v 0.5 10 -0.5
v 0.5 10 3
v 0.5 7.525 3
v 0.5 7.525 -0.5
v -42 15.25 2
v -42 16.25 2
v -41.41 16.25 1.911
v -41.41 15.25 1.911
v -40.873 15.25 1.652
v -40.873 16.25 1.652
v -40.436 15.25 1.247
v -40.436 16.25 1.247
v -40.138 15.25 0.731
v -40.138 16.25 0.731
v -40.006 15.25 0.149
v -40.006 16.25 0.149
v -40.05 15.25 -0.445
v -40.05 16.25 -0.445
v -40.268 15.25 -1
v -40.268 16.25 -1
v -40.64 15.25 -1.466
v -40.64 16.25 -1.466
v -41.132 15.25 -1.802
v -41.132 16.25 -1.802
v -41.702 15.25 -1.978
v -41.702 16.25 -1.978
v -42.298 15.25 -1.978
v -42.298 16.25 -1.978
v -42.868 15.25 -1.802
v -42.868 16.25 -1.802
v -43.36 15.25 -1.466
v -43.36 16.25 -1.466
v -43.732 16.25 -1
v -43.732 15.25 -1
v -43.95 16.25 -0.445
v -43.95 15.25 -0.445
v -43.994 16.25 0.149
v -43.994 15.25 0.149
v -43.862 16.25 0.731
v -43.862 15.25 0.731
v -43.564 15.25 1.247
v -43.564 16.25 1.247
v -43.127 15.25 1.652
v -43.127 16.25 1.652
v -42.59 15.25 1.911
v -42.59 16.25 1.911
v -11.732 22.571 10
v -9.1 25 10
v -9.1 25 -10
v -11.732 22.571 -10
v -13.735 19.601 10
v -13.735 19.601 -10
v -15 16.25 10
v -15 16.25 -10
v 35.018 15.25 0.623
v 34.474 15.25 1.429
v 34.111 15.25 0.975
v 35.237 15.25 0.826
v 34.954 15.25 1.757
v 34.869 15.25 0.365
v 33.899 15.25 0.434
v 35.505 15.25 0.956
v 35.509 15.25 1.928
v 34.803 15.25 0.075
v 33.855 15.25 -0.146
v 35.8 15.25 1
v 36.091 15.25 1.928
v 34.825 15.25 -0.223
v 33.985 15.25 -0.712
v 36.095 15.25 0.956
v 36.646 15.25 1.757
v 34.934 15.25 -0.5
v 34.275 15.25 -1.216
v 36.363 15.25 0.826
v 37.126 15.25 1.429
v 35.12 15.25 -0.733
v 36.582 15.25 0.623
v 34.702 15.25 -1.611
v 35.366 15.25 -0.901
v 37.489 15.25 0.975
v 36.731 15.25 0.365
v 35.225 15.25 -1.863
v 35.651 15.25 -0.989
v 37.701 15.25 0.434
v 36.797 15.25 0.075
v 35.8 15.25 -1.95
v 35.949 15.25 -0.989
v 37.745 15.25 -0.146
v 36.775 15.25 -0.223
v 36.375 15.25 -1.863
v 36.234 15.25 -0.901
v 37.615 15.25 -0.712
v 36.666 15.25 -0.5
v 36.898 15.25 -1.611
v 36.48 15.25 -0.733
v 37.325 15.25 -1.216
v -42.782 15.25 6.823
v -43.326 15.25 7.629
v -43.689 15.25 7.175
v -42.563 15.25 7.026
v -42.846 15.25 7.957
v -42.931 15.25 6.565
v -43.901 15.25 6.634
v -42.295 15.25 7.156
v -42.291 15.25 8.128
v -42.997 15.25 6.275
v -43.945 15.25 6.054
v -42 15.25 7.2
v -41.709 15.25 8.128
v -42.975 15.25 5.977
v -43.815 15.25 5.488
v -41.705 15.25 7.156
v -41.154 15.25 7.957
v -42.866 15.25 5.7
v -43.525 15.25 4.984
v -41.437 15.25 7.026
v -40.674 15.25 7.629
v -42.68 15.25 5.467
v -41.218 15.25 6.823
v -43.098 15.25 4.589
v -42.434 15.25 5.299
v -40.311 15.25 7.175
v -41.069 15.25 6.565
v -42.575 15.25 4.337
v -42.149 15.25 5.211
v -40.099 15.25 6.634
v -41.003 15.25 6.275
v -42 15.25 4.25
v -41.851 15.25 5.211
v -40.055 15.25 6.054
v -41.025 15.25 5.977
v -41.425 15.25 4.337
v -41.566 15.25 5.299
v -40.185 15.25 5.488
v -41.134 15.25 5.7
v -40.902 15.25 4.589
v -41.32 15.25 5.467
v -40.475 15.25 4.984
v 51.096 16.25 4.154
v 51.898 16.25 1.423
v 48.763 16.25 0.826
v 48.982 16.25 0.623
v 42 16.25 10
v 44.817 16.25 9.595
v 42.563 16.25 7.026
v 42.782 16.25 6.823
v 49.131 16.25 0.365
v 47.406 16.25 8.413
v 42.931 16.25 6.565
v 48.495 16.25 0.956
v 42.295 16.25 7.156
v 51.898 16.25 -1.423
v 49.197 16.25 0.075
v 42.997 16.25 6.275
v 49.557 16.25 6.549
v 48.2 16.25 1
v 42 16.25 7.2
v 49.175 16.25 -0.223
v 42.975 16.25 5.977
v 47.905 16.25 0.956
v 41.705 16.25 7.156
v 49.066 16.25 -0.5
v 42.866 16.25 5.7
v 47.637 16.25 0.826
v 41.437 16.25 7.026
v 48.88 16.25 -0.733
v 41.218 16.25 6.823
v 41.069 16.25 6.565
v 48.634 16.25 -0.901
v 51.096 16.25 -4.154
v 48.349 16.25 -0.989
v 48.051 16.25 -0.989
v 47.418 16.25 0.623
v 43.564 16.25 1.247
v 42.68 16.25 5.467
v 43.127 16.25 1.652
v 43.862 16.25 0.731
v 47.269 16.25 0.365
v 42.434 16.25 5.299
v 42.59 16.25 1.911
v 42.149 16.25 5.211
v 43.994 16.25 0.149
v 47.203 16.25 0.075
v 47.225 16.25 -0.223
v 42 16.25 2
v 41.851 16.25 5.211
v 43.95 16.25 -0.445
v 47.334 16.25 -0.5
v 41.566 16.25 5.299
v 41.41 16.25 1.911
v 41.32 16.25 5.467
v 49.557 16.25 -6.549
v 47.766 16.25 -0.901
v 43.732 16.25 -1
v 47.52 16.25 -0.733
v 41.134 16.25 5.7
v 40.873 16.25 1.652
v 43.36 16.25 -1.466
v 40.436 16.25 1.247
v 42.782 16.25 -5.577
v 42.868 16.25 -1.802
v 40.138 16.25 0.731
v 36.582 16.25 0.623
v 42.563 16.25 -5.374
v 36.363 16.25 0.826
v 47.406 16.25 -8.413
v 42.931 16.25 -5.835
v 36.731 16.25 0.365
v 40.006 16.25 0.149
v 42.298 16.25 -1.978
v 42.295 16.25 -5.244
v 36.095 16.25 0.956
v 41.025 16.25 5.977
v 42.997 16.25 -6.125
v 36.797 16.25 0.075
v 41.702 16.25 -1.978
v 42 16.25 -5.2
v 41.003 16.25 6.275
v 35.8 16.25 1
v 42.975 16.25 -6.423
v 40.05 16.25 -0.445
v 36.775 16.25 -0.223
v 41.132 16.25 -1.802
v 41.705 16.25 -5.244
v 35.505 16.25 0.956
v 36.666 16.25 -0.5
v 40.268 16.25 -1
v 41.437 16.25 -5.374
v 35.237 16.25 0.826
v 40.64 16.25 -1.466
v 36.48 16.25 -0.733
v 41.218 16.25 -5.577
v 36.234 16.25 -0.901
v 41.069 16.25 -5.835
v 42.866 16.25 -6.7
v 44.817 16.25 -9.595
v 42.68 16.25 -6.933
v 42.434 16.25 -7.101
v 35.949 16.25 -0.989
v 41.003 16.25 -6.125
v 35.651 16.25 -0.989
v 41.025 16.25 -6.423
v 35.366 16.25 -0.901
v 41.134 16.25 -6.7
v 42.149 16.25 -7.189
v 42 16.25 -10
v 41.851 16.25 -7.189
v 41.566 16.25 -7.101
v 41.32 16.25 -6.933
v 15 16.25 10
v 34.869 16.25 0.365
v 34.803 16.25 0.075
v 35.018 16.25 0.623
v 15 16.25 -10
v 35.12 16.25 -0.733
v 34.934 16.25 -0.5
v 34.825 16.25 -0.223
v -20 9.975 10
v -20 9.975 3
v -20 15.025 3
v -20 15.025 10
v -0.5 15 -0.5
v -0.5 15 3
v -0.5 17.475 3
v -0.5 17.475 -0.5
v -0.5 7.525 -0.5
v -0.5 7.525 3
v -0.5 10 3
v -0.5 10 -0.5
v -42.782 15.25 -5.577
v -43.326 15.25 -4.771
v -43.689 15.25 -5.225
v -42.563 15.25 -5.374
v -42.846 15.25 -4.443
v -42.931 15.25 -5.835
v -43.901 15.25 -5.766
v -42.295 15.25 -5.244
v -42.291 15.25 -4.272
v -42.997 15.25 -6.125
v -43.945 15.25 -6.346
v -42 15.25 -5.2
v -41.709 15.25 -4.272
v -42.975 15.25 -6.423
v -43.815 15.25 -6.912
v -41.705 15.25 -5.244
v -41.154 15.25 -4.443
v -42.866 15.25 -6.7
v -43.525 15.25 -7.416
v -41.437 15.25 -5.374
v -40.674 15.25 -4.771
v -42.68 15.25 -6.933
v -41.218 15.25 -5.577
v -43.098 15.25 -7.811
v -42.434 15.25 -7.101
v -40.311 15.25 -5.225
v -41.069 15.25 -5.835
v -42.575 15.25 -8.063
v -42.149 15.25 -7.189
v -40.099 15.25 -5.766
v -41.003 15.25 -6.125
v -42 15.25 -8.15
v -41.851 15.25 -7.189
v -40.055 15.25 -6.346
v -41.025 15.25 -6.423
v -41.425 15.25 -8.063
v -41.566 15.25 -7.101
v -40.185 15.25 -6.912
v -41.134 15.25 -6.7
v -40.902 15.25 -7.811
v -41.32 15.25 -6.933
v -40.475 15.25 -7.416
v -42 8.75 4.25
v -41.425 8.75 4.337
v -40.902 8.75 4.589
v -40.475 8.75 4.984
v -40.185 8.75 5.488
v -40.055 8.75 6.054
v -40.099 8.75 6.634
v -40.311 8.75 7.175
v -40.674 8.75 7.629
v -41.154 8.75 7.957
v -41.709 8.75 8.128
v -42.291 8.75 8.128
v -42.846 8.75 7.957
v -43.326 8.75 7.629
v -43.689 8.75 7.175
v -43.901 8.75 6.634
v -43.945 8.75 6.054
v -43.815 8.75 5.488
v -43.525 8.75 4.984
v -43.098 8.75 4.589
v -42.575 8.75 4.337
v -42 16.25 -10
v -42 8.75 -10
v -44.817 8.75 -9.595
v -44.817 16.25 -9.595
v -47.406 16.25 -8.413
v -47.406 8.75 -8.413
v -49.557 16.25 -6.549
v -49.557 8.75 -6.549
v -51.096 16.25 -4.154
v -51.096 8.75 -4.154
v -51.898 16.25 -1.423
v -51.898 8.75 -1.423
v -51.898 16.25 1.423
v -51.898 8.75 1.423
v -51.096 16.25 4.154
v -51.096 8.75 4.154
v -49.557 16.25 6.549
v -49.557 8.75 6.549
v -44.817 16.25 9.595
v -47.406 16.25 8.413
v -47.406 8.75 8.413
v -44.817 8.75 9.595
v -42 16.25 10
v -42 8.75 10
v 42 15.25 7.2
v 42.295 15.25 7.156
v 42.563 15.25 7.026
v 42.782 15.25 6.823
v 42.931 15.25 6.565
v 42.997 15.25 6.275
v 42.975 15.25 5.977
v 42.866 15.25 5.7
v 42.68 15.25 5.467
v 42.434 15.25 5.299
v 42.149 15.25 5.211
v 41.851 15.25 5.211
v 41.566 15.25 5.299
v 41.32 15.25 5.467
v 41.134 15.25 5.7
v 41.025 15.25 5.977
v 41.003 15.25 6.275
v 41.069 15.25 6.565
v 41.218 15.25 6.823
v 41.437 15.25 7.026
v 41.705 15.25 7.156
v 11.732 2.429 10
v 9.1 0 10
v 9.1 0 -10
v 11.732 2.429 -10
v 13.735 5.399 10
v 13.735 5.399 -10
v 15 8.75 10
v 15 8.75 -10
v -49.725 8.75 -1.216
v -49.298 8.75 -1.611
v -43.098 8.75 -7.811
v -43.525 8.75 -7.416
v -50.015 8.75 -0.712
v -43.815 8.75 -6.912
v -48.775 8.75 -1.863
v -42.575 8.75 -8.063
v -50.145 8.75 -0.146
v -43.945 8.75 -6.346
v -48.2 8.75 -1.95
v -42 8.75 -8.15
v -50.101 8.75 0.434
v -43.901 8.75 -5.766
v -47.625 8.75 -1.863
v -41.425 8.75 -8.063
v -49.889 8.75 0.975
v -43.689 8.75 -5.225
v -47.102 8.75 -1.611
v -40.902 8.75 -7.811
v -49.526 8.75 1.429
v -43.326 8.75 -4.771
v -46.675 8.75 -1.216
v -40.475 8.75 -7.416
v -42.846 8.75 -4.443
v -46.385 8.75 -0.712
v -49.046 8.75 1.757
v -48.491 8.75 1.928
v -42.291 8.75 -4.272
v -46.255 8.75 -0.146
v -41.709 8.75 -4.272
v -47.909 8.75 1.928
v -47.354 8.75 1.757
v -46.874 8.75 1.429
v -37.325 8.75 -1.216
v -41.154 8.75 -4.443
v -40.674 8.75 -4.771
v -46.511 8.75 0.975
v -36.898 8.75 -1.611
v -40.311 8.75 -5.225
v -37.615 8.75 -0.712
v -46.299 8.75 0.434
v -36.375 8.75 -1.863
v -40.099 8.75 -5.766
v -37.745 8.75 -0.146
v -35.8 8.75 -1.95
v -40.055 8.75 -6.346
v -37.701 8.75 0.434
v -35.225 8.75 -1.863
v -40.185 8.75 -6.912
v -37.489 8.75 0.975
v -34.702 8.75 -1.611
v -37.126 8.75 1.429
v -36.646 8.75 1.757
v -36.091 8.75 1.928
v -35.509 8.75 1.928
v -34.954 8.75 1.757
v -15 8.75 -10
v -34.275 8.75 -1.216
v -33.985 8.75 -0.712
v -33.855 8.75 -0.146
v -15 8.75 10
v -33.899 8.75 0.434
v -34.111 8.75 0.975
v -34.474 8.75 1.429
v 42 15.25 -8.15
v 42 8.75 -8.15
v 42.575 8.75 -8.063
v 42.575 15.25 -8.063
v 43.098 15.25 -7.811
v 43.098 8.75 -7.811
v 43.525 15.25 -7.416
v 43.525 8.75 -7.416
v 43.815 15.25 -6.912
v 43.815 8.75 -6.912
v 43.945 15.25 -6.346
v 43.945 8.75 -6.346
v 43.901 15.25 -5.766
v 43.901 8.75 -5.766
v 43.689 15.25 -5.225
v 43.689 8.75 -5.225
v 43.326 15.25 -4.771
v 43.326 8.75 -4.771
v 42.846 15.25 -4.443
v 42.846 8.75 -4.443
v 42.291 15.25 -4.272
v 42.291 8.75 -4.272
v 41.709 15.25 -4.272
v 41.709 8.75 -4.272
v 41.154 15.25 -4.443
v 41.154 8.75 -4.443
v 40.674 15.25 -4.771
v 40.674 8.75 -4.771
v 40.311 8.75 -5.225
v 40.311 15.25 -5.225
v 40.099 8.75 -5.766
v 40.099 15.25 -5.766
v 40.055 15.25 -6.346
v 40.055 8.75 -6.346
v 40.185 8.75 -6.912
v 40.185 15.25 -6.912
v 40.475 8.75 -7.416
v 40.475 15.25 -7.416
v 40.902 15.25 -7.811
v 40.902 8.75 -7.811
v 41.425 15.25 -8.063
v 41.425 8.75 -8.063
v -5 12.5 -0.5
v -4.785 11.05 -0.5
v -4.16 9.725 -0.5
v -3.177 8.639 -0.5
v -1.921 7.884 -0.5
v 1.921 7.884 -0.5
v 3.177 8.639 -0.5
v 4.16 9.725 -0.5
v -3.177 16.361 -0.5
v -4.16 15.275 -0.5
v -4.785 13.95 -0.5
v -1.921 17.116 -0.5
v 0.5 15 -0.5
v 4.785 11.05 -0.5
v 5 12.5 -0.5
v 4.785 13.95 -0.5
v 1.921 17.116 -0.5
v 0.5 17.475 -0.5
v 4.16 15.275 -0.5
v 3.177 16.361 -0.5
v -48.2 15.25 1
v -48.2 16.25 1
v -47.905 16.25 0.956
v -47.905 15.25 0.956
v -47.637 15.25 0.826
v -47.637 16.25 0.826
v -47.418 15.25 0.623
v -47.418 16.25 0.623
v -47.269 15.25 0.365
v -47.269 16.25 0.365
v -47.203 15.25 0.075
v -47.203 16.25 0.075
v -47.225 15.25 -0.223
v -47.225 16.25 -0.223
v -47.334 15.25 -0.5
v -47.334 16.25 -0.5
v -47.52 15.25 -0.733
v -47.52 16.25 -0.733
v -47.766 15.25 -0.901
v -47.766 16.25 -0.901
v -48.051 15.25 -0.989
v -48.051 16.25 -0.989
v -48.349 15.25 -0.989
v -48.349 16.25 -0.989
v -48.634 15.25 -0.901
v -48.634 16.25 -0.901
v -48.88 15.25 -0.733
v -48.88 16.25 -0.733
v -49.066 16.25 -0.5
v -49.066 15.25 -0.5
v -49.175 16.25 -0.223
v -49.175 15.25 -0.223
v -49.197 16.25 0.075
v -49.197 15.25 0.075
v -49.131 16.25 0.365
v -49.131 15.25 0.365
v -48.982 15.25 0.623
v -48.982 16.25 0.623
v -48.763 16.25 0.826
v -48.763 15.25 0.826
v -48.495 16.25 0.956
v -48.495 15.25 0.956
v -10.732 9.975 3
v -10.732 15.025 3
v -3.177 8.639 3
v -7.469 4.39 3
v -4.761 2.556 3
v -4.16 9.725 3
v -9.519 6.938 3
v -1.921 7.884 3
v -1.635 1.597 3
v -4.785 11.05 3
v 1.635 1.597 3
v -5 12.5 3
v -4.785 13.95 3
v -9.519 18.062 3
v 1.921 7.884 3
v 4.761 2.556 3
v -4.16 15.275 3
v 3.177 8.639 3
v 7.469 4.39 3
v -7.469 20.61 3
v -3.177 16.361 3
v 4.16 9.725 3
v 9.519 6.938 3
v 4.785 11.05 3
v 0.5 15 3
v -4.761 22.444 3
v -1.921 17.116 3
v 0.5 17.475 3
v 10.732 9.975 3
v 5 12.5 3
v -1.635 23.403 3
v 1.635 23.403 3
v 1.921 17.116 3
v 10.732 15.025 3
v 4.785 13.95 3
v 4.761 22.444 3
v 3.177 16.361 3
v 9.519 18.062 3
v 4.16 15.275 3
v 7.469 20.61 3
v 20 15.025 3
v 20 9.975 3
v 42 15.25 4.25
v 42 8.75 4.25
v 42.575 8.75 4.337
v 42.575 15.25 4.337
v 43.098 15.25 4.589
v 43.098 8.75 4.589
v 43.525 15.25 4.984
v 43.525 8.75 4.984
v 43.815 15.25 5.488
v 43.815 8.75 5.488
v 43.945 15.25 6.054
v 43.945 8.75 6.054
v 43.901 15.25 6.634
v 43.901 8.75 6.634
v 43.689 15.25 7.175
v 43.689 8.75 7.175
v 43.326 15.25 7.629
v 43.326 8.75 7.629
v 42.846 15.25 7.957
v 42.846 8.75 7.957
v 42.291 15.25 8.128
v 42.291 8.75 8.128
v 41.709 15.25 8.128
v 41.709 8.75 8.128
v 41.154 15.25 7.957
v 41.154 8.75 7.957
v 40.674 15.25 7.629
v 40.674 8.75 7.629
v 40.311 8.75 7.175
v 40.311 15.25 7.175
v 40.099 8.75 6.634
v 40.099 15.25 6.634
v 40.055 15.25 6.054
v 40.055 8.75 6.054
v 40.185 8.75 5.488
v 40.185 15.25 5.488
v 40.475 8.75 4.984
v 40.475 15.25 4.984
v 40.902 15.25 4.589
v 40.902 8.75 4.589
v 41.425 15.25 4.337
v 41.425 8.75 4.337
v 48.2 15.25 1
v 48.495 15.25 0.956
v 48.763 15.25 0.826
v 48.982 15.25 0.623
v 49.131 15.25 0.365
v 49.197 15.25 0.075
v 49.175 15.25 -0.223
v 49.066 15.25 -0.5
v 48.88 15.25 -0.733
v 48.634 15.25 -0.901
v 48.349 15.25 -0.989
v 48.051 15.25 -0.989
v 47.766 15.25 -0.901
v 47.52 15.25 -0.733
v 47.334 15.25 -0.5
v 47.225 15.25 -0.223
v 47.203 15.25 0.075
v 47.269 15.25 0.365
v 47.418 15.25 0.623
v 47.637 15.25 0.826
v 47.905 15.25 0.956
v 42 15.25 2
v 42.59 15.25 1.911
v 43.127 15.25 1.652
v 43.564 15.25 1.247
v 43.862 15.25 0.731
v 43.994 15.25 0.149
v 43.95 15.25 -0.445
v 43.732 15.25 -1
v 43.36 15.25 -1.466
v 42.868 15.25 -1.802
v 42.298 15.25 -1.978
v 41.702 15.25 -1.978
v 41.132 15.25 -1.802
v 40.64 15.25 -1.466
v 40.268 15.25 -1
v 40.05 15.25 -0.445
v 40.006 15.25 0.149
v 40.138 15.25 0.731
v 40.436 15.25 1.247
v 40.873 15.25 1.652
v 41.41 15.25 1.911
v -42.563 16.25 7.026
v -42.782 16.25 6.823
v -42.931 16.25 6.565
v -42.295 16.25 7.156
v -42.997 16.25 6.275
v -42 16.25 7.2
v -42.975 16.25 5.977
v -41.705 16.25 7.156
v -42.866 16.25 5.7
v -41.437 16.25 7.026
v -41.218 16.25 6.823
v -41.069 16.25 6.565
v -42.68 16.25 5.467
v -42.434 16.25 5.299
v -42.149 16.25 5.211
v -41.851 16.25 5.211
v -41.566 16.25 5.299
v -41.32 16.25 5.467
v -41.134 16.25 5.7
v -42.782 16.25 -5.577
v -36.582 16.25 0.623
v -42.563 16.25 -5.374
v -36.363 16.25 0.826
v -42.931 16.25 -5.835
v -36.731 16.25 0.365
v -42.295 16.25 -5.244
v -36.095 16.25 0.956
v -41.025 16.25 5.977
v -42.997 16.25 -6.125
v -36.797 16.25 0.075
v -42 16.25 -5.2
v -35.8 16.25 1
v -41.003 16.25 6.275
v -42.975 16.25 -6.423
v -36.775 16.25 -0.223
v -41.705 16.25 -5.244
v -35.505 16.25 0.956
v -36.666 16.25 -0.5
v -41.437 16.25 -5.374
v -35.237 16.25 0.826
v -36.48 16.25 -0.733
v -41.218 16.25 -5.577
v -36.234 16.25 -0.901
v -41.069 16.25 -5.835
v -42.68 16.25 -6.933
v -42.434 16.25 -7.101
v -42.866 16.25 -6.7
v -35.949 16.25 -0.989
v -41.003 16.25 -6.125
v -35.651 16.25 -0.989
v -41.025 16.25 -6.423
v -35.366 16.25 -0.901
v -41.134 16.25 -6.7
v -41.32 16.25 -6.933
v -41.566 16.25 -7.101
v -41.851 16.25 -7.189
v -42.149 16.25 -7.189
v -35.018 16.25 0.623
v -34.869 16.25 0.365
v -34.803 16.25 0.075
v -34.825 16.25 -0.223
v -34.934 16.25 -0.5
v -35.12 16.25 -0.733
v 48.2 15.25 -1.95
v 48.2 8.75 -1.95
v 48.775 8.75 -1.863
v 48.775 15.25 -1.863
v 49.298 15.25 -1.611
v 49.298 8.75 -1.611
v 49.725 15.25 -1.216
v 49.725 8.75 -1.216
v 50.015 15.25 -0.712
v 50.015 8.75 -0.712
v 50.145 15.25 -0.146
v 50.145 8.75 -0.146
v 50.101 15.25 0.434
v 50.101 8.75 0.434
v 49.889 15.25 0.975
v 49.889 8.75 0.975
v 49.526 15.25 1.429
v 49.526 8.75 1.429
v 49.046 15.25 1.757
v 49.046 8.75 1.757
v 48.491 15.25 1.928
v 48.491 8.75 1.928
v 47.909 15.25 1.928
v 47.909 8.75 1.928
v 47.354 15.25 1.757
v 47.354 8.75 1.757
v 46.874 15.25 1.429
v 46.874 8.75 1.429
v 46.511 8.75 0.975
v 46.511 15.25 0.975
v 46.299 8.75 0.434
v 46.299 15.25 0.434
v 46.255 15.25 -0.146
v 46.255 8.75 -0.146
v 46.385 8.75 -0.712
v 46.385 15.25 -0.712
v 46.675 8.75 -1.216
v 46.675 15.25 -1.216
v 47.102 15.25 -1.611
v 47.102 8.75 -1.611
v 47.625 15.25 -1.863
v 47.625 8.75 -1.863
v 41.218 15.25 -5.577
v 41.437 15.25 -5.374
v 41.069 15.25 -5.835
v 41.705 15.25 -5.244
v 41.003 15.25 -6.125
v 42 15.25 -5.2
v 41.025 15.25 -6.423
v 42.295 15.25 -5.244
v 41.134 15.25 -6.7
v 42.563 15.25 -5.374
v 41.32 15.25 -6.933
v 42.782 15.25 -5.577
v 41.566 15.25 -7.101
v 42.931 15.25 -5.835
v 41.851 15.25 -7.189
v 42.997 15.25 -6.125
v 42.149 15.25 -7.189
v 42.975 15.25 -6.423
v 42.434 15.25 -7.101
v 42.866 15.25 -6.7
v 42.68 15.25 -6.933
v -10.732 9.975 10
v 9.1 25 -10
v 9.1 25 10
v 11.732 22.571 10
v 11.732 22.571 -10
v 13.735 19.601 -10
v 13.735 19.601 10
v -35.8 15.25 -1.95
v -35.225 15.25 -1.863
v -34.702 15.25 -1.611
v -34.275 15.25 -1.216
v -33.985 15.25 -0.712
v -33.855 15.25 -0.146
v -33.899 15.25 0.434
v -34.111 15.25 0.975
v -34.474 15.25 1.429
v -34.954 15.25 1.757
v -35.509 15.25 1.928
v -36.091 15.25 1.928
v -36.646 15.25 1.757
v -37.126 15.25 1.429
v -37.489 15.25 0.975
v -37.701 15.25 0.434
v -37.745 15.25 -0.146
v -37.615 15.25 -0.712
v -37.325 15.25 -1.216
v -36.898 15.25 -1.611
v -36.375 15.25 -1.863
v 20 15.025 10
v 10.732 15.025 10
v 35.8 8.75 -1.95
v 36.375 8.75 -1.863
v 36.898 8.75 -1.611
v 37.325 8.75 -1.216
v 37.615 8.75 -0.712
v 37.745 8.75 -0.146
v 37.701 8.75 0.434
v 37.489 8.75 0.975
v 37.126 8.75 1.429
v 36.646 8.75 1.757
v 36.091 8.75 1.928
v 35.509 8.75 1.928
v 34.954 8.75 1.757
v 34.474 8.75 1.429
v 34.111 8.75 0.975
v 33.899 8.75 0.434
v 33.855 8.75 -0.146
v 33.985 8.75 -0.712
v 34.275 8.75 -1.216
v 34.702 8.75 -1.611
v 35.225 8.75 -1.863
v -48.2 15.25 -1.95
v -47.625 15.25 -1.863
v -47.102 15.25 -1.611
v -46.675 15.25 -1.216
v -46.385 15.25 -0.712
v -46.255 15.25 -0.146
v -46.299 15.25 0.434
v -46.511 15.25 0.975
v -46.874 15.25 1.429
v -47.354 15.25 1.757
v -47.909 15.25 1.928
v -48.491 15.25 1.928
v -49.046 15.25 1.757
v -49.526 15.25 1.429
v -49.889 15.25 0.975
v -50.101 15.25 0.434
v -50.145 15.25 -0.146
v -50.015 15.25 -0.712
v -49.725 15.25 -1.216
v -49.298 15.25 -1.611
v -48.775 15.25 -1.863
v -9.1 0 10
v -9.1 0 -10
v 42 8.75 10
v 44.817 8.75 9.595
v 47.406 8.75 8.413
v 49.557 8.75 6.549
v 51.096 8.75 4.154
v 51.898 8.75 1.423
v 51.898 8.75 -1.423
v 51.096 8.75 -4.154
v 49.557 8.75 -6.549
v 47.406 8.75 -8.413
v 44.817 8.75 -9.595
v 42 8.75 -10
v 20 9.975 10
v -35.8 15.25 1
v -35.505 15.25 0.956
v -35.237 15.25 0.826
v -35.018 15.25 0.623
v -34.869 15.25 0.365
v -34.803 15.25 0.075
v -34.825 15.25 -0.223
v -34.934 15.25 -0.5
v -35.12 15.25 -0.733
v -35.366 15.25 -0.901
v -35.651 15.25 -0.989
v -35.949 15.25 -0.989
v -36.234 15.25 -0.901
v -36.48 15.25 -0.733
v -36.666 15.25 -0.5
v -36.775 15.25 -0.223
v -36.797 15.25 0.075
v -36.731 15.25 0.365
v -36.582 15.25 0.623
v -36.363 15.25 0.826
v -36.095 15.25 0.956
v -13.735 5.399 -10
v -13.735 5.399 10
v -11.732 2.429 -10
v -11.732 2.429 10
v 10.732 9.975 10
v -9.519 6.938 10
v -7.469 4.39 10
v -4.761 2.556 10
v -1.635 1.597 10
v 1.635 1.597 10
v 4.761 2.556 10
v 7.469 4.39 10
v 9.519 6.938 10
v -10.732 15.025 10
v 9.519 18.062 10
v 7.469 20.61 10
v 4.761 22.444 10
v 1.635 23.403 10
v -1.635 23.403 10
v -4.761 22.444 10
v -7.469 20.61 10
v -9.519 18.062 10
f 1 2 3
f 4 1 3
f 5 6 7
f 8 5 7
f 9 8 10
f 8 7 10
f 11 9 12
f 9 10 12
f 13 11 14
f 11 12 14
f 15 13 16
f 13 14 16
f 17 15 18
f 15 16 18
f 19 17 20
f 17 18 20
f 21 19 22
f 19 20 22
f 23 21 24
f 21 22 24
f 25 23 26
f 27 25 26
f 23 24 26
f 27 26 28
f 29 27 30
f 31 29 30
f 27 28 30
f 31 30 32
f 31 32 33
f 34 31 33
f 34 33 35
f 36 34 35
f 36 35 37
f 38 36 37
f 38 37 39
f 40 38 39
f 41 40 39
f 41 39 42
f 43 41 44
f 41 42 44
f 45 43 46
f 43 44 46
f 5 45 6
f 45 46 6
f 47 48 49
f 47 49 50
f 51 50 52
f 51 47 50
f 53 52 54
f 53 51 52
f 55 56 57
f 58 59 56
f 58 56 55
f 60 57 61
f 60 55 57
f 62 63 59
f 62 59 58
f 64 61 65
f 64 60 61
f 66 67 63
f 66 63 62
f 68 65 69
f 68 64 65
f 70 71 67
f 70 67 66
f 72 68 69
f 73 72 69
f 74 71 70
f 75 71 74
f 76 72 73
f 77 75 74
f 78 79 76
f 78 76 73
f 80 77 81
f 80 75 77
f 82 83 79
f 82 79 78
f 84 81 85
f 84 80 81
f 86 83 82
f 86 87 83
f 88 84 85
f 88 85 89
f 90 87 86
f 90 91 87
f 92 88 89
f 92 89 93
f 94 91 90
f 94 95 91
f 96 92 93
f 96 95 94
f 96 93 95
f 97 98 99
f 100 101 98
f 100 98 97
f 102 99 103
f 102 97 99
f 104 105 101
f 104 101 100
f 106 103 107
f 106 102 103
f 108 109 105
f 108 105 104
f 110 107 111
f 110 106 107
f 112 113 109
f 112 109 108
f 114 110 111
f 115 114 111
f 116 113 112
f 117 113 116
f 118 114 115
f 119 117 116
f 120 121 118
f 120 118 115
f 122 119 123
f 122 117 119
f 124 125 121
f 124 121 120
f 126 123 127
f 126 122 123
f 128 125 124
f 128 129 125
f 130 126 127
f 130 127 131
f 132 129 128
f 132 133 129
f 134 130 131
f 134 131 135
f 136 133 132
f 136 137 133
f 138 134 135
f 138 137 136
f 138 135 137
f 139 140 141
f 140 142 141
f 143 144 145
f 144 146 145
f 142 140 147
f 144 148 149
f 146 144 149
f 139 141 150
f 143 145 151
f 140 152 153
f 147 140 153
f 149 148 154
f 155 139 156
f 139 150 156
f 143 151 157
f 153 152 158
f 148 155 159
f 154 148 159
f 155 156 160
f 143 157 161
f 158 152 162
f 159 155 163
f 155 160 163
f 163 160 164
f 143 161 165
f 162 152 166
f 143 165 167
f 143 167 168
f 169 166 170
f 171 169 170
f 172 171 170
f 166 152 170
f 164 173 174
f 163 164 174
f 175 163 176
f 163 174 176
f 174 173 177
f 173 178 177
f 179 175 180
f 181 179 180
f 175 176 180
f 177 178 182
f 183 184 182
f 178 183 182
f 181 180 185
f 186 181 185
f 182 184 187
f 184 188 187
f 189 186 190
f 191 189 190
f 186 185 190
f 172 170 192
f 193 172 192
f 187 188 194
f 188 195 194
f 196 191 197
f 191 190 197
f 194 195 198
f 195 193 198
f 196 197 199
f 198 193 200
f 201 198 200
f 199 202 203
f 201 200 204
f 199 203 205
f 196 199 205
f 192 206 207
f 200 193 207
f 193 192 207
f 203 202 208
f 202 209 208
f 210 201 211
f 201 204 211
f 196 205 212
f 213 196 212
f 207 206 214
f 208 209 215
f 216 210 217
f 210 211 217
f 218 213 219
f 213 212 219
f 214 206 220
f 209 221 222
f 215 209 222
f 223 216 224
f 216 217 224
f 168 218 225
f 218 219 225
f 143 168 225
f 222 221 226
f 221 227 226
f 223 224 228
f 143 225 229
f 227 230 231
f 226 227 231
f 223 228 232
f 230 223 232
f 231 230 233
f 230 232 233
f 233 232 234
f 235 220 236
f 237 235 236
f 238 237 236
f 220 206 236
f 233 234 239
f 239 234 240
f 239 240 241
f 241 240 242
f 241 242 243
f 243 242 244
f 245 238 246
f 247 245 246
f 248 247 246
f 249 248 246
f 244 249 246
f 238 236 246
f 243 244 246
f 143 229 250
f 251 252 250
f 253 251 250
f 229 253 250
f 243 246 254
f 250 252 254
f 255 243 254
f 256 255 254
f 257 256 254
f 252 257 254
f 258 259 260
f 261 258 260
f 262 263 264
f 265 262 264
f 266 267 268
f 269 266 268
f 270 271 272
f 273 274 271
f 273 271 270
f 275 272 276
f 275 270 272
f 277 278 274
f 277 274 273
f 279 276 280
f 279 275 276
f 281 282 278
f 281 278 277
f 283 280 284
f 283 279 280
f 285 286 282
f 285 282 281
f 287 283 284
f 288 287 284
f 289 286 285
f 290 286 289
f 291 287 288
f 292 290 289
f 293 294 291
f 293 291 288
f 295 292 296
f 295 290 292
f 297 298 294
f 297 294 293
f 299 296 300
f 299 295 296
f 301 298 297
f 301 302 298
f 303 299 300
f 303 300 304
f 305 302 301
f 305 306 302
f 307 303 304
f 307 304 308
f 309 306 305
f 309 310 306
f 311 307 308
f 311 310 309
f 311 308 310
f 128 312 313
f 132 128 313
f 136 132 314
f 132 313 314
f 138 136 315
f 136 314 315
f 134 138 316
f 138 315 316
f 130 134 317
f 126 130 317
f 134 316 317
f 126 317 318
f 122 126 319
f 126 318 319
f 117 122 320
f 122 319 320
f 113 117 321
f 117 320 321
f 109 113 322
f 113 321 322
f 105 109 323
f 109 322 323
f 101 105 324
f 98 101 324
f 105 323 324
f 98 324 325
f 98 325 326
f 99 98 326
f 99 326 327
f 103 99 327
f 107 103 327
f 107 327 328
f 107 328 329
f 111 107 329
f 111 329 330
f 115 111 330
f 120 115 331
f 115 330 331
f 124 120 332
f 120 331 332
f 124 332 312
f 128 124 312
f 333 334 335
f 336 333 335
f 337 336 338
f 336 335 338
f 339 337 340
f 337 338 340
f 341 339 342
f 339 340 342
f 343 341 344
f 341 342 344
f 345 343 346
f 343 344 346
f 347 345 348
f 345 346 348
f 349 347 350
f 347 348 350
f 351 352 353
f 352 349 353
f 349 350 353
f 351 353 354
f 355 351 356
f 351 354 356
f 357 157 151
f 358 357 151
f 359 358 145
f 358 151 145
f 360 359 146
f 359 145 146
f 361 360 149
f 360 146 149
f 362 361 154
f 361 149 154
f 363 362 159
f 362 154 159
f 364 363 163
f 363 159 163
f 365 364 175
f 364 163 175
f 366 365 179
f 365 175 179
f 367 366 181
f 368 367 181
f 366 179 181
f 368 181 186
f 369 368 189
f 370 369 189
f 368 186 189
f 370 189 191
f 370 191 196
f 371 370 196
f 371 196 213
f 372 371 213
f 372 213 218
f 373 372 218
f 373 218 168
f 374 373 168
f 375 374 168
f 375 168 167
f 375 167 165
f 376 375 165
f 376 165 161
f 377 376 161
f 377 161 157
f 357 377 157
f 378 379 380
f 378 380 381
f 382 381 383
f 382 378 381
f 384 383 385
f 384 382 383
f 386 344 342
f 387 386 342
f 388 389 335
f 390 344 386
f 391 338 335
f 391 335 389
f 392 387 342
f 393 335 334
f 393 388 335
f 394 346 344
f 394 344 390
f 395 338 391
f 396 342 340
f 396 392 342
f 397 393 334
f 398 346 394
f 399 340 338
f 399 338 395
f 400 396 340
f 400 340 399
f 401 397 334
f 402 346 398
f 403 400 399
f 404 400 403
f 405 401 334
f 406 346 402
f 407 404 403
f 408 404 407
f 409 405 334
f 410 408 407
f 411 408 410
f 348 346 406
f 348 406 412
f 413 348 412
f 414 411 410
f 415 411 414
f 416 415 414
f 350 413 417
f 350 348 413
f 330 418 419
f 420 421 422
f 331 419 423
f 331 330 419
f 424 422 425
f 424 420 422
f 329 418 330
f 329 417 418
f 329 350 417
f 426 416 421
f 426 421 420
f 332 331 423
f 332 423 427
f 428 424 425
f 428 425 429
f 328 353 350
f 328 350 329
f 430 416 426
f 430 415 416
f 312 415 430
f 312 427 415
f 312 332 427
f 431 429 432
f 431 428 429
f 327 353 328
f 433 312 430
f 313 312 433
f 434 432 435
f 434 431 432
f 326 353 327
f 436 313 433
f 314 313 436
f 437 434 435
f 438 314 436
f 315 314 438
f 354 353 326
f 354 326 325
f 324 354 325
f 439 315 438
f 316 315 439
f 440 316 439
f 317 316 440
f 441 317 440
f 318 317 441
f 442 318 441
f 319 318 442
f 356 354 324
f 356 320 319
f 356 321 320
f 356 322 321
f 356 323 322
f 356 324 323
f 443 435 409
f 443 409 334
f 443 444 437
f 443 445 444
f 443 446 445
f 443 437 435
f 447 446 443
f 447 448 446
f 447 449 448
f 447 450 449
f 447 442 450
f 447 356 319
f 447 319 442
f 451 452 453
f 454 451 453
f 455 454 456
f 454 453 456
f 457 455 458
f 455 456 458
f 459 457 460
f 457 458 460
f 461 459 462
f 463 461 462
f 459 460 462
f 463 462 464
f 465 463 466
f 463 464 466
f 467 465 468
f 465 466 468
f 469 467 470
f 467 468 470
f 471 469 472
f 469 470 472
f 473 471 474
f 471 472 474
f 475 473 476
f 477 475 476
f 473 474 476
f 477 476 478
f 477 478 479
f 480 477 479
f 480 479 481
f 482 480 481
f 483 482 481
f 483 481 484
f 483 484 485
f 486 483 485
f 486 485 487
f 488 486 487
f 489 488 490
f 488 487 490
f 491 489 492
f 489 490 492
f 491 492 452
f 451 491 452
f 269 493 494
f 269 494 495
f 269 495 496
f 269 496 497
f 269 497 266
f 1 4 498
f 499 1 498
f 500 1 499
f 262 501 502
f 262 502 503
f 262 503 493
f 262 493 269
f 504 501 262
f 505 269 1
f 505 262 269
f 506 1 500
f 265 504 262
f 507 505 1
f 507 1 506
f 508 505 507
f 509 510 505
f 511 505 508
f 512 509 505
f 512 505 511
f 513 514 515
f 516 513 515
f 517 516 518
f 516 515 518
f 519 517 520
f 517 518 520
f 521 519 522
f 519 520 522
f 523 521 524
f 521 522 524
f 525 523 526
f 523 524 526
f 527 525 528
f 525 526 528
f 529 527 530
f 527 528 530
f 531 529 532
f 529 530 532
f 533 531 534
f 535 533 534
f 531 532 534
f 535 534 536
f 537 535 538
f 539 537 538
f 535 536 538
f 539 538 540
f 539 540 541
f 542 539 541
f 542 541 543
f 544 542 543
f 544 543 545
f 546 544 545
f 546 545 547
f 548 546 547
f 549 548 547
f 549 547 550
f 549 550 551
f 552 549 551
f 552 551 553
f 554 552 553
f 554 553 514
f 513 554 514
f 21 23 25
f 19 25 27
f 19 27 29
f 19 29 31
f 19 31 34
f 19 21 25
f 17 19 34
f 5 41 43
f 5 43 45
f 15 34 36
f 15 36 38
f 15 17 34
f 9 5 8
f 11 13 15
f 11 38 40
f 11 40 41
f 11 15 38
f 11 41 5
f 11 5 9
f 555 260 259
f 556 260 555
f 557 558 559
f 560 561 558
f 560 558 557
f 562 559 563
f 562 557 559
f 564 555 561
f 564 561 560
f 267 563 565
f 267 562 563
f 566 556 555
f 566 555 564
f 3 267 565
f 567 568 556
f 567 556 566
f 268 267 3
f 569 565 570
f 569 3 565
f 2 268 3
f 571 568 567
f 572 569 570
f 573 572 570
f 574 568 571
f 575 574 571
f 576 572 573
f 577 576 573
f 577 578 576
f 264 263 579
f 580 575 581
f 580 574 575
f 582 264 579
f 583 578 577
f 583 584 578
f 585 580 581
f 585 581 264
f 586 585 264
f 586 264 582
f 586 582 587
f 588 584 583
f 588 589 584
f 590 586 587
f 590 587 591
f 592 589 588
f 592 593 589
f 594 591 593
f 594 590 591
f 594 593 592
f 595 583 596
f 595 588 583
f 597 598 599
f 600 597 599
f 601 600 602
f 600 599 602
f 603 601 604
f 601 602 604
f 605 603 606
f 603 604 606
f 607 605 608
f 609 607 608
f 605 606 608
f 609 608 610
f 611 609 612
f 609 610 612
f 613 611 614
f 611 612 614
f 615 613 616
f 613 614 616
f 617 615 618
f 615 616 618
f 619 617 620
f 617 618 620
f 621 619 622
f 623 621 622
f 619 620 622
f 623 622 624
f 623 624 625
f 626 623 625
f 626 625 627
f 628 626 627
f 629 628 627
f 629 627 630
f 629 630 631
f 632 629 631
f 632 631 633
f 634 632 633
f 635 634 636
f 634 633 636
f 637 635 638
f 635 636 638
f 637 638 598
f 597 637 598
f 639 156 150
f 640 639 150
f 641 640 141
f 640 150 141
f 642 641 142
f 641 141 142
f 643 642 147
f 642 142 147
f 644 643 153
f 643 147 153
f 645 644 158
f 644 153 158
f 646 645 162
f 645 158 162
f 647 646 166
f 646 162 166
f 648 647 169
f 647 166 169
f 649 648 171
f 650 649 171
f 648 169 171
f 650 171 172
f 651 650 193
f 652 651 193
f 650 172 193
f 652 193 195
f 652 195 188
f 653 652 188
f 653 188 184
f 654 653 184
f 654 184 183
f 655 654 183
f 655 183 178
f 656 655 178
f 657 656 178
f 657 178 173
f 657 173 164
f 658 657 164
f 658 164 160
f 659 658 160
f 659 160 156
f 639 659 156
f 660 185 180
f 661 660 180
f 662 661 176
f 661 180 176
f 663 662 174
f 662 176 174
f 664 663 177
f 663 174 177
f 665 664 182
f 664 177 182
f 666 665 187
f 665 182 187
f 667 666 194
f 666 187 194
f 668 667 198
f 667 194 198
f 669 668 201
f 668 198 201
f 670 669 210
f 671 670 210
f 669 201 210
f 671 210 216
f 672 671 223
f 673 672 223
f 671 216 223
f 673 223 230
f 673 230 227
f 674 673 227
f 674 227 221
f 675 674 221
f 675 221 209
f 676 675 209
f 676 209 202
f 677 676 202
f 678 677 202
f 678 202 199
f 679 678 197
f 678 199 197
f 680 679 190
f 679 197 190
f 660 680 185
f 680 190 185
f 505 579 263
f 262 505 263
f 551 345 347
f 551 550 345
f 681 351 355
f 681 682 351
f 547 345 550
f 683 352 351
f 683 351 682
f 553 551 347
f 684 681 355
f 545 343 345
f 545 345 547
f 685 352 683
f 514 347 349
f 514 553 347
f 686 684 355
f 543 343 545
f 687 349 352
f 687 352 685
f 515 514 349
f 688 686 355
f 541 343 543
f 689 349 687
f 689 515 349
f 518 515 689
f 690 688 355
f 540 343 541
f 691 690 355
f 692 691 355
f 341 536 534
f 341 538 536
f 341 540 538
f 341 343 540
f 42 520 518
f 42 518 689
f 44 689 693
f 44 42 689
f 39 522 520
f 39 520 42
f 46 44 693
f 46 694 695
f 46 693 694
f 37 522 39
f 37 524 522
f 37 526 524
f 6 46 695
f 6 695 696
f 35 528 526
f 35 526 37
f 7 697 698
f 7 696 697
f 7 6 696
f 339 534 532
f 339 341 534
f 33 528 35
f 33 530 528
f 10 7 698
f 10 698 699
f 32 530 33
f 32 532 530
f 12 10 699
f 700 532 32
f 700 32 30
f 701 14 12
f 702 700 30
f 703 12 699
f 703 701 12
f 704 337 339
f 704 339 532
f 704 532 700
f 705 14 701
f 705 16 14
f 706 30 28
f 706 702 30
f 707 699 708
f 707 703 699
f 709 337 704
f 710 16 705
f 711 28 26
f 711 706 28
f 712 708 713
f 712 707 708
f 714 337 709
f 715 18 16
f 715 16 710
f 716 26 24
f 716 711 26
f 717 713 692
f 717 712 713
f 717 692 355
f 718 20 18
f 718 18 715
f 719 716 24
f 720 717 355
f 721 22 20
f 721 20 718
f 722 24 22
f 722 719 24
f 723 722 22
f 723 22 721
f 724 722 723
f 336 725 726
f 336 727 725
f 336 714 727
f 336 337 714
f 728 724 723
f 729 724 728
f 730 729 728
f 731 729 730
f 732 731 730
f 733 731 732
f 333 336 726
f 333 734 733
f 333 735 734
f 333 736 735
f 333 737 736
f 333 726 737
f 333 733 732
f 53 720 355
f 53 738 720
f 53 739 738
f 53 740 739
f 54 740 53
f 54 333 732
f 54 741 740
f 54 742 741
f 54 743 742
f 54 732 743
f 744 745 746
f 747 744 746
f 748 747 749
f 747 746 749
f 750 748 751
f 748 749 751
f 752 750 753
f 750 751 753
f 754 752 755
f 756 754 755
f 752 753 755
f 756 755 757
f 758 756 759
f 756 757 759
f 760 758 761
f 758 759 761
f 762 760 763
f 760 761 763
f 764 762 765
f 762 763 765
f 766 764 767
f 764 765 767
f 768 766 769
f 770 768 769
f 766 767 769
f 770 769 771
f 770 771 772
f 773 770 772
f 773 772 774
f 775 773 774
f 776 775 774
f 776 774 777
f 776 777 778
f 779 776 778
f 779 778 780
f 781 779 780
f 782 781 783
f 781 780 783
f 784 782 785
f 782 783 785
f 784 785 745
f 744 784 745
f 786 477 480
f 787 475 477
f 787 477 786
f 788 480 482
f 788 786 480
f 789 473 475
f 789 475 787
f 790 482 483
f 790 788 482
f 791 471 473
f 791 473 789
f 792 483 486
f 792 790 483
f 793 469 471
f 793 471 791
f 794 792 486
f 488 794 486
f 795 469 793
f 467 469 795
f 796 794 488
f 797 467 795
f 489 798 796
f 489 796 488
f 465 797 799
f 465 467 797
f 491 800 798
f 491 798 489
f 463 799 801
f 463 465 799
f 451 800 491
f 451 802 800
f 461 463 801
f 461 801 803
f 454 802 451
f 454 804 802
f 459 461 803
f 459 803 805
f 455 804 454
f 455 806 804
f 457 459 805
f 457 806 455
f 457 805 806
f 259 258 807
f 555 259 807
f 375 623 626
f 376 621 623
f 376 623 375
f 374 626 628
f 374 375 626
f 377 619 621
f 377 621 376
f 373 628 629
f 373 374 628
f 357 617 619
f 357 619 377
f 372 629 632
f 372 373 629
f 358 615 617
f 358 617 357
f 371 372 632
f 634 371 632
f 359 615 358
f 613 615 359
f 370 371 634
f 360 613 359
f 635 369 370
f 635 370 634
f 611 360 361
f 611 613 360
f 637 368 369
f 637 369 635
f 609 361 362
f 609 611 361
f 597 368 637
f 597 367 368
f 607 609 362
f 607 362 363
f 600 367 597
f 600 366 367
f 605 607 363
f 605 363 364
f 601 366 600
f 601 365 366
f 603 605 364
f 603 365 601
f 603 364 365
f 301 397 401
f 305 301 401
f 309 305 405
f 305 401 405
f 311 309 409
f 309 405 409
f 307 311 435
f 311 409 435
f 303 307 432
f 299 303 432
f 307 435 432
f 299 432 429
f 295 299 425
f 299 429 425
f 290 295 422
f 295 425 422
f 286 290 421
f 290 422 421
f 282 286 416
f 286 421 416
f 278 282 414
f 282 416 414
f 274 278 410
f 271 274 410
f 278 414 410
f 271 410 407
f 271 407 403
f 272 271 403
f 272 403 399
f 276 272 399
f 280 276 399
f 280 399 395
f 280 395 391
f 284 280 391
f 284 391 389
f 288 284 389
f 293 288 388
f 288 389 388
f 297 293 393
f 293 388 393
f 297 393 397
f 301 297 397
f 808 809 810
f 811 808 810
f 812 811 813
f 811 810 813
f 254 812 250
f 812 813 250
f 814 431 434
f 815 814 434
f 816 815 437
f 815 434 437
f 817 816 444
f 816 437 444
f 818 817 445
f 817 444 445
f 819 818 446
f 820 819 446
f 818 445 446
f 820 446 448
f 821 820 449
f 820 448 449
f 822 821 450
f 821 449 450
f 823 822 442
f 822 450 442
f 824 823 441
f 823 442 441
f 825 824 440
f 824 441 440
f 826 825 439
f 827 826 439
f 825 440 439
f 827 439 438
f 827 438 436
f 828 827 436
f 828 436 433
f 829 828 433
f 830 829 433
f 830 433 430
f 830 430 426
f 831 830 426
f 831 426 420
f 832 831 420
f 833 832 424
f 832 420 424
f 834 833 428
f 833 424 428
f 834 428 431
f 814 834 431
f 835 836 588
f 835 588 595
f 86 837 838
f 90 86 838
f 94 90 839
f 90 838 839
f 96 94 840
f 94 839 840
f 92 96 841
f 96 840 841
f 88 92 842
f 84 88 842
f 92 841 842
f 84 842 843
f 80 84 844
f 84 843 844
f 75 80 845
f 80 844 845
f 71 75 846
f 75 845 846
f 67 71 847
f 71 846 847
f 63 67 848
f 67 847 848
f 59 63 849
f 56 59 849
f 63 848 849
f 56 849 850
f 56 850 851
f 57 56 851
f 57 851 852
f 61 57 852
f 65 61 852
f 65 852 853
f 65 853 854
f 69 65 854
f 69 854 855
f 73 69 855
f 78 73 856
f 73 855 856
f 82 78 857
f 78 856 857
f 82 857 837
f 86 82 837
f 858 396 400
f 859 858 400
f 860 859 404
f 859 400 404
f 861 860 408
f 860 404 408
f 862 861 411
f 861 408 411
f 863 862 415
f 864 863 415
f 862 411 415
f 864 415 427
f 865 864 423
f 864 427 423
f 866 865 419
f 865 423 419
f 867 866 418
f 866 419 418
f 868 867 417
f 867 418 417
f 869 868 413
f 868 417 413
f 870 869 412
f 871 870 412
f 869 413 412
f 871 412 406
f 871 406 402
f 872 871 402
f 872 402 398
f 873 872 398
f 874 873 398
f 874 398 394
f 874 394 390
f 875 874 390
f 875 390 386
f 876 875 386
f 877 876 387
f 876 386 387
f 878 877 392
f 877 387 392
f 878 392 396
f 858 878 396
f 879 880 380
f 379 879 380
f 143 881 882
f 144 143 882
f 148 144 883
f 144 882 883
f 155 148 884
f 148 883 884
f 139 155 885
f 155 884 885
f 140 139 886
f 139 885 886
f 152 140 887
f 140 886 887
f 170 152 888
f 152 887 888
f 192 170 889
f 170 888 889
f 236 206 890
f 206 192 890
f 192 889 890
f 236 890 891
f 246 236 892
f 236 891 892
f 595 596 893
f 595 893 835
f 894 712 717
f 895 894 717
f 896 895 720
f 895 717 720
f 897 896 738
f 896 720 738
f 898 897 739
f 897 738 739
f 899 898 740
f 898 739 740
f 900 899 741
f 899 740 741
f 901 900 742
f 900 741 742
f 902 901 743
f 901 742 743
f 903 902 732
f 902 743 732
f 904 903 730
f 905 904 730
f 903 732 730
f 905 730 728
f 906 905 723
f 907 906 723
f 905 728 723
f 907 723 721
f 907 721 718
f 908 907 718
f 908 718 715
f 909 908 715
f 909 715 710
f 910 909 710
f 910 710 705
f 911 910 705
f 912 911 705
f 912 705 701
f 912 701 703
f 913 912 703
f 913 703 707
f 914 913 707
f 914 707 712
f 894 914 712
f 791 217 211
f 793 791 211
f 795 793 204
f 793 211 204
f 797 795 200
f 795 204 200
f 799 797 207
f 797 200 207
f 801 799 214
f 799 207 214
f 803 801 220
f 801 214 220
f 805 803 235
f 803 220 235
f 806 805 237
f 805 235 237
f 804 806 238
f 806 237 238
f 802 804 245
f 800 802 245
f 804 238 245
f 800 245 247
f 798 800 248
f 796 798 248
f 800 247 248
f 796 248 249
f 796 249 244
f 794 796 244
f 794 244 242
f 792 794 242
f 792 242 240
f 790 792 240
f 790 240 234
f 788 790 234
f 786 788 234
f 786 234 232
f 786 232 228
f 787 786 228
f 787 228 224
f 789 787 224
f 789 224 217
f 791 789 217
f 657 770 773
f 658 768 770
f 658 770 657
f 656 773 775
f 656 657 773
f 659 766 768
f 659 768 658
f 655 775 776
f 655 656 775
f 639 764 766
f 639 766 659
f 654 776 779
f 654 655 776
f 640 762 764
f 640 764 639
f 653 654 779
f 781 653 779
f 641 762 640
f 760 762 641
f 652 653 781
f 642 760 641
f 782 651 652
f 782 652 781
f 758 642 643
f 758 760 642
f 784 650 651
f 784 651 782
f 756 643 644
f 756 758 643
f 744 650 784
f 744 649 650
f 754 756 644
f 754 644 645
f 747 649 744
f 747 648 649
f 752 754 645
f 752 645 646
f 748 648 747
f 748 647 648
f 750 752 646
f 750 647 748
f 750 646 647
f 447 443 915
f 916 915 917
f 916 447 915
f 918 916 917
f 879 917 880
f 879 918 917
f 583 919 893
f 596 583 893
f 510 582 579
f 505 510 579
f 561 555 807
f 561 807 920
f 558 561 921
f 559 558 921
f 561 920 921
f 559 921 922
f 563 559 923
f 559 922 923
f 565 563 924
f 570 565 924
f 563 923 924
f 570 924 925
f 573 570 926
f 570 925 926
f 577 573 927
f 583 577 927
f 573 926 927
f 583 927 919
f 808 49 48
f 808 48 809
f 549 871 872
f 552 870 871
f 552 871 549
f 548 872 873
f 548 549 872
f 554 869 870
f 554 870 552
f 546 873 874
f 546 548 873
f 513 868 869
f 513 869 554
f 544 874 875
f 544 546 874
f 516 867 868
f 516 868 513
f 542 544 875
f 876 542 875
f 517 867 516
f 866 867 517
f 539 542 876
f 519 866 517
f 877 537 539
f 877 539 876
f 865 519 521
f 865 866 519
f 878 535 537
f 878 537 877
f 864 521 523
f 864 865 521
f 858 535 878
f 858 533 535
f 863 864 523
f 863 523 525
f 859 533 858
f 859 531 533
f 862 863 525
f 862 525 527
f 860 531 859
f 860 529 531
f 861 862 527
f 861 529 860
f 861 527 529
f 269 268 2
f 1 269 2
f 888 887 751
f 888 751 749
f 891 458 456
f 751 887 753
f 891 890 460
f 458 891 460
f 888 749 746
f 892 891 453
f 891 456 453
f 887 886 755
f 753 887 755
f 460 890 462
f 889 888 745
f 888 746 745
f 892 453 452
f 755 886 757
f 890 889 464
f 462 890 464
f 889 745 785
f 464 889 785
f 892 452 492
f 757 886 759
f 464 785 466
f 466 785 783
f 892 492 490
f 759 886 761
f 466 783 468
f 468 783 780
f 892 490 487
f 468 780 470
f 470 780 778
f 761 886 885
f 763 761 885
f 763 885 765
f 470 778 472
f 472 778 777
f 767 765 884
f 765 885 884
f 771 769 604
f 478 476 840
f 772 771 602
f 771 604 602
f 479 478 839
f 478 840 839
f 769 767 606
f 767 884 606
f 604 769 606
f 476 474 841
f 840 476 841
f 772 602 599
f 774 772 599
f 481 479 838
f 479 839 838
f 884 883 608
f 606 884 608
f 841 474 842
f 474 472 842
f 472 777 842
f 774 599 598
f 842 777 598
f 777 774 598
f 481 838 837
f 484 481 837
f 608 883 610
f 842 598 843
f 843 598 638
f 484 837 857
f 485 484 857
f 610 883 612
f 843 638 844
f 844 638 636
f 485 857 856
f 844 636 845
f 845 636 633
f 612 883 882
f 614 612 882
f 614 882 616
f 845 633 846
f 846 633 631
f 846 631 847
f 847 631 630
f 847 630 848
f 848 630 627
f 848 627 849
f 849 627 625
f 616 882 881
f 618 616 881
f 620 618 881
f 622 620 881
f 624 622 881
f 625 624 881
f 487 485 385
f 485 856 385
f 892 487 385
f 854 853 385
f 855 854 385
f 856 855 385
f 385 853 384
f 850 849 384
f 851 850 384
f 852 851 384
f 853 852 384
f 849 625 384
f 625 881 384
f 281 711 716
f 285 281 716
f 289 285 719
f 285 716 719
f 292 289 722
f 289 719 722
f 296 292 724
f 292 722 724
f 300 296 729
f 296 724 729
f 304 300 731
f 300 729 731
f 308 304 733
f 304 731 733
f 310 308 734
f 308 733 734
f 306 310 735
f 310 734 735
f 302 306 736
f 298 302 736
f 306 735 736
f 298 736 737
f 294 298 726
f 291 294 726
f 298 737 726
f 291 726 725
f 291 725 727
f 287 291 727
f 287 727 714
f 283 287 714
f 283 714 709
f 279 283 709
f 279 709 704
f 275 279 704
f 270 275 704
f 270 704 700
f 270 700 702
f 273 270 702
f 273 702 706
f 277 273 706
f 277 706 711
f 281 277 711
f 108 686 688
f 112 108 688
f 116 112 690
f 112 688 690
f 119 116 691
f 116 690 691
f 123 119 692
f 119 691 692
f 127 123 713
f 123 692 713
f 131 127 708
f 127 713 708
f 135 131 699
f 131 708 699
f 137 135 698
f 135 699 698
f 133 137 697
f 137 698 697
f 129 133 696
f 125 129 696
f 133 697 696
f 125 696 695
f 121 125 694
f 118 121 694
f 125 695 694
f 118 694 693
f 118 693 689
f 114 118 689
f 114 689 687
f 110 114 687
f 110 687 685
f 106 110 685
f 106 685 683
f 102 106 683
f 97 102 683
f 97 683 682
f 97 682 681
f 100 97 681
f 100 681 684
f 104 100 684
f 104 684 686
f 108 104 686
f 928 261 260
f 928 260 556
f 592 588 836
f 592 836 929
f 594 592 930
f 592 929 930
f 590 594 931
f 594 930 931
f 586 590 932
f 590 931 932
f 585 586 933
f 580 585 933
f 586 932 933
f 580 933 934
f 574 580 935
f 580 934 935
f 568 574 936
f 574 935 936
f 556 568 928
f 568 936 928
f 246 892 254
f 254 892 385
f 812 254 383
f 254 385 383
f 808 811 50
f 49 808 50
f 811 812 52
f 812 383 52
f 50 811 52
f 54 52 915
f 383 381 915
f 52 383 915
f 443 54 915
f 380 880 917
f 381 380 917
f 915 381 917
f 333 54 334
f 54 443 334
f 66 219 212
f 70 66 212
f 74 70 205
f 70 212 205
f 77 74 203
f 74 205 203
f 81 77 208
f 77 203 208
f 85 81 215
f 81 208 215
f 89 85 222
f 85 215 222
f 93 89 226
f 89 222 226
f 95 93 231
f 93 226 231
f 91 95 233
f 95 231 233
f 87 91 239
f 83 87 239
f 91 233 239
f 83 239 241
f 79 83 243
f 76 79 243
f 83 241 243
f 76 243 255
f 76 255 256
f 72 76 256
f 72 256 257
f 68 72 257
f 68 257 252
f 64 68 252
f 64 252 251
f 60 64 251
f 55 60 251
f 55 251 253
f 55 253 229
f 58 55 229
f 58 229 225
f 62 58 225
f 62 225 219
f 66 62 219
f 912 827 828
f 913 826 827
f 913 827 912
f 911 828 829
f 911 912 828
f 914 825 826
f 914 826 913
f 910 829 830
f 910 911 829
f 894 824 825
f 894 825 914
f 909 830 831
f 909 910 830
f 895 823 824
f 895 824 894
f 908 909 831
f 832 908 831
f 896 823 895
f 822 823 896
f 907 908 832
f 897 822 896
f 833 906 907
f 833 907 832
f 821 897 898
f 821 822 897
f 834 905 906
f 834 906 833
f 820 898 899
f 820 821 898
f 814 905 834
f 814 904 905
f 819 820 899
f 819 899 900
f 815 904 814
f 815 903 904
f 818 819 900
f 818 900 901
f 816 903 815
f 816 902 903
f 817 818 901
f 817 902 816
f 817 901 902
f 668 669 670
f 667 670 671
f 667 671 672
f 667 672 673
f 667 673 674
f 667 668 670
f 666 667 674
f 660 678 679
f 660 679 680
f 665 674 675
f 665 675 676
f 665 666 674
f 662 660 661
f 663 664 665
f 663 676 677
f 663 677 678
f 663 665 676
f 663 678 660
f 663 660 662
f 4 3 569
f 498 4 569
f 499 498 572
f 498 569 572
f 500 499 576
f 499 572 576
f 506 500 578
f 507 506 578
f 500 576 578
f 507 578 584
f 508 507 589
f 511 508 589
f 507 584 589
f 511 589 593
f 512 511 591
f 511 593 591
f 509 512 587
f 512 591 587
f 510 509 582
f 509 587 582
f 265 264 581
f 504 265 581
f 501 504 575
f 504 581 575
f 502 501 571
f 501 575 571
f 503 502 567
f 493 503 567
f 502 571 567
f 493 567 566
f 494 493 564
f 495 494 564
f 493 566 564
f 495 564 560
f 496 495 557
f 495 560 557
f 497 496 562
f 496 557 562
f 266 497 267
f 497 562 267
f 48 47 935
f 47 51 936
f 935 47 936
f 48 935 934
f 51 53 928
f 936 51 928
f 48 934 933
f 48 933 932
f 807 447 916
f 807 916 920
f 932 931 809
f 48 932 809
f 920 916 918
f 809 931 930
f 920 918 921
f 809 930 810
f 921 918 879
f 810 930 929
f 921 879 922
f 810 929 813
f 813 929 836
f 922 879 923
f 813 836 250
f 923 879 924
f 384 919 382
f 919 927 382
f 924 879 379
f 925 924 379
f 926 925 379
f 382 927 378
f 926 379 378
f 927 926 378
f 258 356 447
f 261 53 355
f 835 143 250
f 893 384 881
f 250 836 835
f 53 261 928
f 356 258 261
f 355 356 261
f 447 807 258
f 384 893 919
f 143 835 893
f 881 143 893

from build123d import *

# Parameters (mm, degrees)
BOSS_EXTRUDE1_DEPTH = 25
SKETCH2_R           = 11.025
CUT_EXTRUDE1_DEPTH  = 7
CUT_EXTRUDE3_DEPTH  = 8.75
CUT_EXTRUDE5_DEPTH  = 8.75
SKETCH5_R           = 1
CUT_EXTRUDE6_DEPTH  = 7.5
SKETCH6_R           = 1.95
CUT_EXTRUDE7_DEPTH  = 6.5
SKETCH7_R           = 2
CUT_EXTRUDE8_DEPTH  = 1
CUT_EXTRUDE9_DEPTH  = 62.065538563
CUT_EXTRUDE10_DEPTH = 3.5
SKETCH10_W          = 40
SKETCH10_H          = 5.05
CUT_EXTRUDE11_DEPTH = 7


with BuildPart() as part:
    # Sketch1 → Boss-Extrude1 (new body)
    with BuildSketch(Plane(origin=(0, 0, 0), x_dir=(1, 0, 0), z_dir=(0, 1, 0))):
        with BuildLine():
            Line((-42, -10), (42, -10))
            ThreePointArc((42, -10), (52, 0), (42, 10))
            Line((42, 10), (-42, 10))
            ThreePointArc((-42, 10), (-52, 0), (-42, -10))
        make_face()
    extrude(amount=BOSS_EXTRUDE1_DEPTH)

    # Sketch2 → Cut-Extrude1 (cut)
    with BuildSketch(Plane.XY.offset(10)):
        with Locations((0, 12.5)):
            Circle(SKETCH2_R)
    extrude(amount=-CUT_EXTRUDE1_DEPTH, mode=Mode.SUBTRACT)

    # Sketch3 → Cut-Extrude3 (cut)
    with BuildSketch(Plane.XZ):
        with BuildLine():
            Line((15, -10), (15, 10))
            Line((15, 10), (42, 10))
            ThreePointArc((42, 10), (52, 0), (42, -10))
            Line((42, -10), (15, -10))
        make_face()
        with BuildLine():
            Line((-15, -10), (-15, 10))
            Line((-15, 10), (-42, 10))
            ThreePointArc((-42, 10), (-52, 0), (-42, -10))
            Line((-42, -10), (-15, -10))
        make_face()
    extrude(amount=-CUT_EXTRUDE3_DEPTH, mode=Mode.SUBTRACT)

    # Sketch4 → Cut-Extrude5 (cut)
    with BuildSketch(Plane(origin=(0, 25, 0), x_dir=(1, 0, 0), z_dir=(0, 1, 0))):
        with BuildLine():
            Line((15, -10), (15, 10))
            Line((15, 10), (55, 10))
            ThreePointArc((55, 10), (65, 0), (55, -10))
            Line((55, -10), (15, -10))
        make_face()
        with BuildLine():
            Line((-15, -10), (-15, 10))
            Line((-15, 10), (-55, 10))
            ThreePointArc((-55, 10), (-65, 0), (-55, -10))
            Line((-55, -10), (-15, -10))
        make_face()
    extrude(amount=-CUT_EXTRUDE5_DEPTH, mode=Mode.SUBTRACT)

    # Sketch5 → Cut-Extrude6 (cut)
    with BuildSketch(Plane(origin=(0, 16.25, 0), x_dir=(1, 0, 0), z_dir=(0, 1, 0))):
        with Locations(Location((-42, 6.2, 0), (0, 0, 270))):
            Circle(SKETCH5_R)
        with Locations(Location((-35.8, 0, 0), (0, 0, 270))):
            Circle(SKETCH5_R)
        with Locations(Location((-42, -6.2, 0), (0, 0, 270))):
            Circle(SKETCH5_R)
        with Locations(Location((-48.2, 0, 0), (0, 0, 270))):
            Circle(SKETCH5_R)
        with Locations(Location((42, 6.2, 0), (0, 0, 270))):
            Circle(SKETCH5_R)
        with Locations(Location((48.2, 0, 0), (0, 0, 270))):
            Circle(SKETCH5_R)
        with Locations(Location((42, -6.2, 0), (0, 0, 270))):
            Circle(SKETCH5_R)
        with Locations(Location((35.8, 0, 0), (0, 0, 270))):
            Circle(SKETCH5_R)
    extrude(amount=-CUT_EXTRUDE6_DEPTH, mode=Mode.SUBTRACT)

    # Sketch6 → Cut-Extrude7 (cut)
    with BuildSketch(Plane.XZ.offset(-8.75)):
        with Locations(Location((-42, 6.2, 0), (0, 0, 270))):
            Circle(SKETCH6_R)
        with Locations(Location((-35.8, 0, 0), (0, 0, 270))):
            Circle(SKETCH6_R)
        with Locations(Location((-48.2, 0, 0), (0, 0, 270))):
            Circle(SKETCH6_R)
        with Locations(Location((-42, -6.2, 0), (0, 0, 270))):
            Circle(SKETCH6_R)
        with Locations(Location((42, 6.2, 0), (0, 0, 270))):
            Circle(SKETCH6_R)
        with Locations(Location((48.2, 0, 0), (0, 0, 270))):
            Circle(SKETCH6_R)
        with Locations(Location((35.8, 0, 0), (0, 0, 270))):
            Circle(SKETCH6_R)
        with Locations(Location((42, -6.2, 0), (0, 0, 270))):
            Circle(SKETCH6_R)
    extrude(amount=-CUT_EXTRUDE7_DEPTH, mode=Mode.SUBTRACT)

    # Sketch7 → Cut-Extrude8 (cut)
    with BuildSketch(Plane(origin=(0, 16.25, 0), x_dir=(1, 0, 0), z_dir=(0, 1, 0))):
        with Locations(Location((-42, 0, 0), (0, 0, 270))):
            Circle(SKETCH7_R)
        with Locations(Location((42, 0, 0), (0, 0, 270))):
            Circle(SKETCH7_R)
    extrude(amount=-CUT_EXTRUDE8_DEPTH, mode=Mode.SUBTRACT)

    # Sketch8 → Cut-Extrude9 (cut, through all)
    with BuildSketch(Plane.XY.offset(10)):
        with BuildLine():
            Line((-15, 16.25), (-15, 25))
            Line((-15, 25), (-9.100137362, 25))
            ThreePointArc((-9.100137362, 25), (-12.819702813, 21.143941218), (-15, 16.25))
        make_face()
        with BuildLine():
            Line((15, 0), (9.100137362, 0))
            ThreePointArc((9.100137362, 0), (12.819702813, 3.856058782), (15, 8.75))
            Line((15, 8.75), (15, 0))
        make_face()
        with BuildLine():
            Line((15, 25), (9.100137362, 25))
            ThreePointArc((9.100137362, 25), (12.819702813, 21.143941218), (15, 16.25))
            Line((15, 16.25), (15, 25))
        make_face()
        with BuildLine():
            Line((-15, 0), (-15, 8.75))
            ThreePointArc((-15, 8.75), (-12.819702813, 3.856058782), (-9.100137362, 0))
            Line((-9.100137362, 0), (-15, 0))
        make_face()
    extrude(amount=-CUT_EXTRUDE9_DEPTH, mode=Mode.SUBTRACT)

    # Sketch9 → Cut-Extrude10 (cut)
    with BuildSketch(Plane.XY.offset(3)):
        with BuildLine():
            Line((0.5, 10), (0.5, 7.525062814))
            ThreePointArc((0.5, 7.525062814), (5, 12.5), (0.5, 17.474937186))
            Line((0.5, 17.474937186), (0.5, 15))
            Line((0.5, 15), (-0.5, 15))
            Line((-0.5, 15), (-0.5, 17.474937186))
            ThreePointArc((-0.5, 17.474937186), (-5, 12.5), (-0.5, 7.525062814))
            Line((-0.5, 7.525062814), (-0.5, 10))
            Line((-0.5, 10), (0.5, 10))
        make_face()
    extrude(amount=-CUT_EXTRUDE10_DEPTH, mode=Mode.SUBTRACT)

    # Sketch10 → Cut-Extrude11 (cut)
    with BuildSketch(Plane.XY.offset(10)):
        with Locations((0, 12.5)):
            Rectangle(SKETCH10_W, SKETCH10_H)
    extrude(amount=-CUT_EXTRUDE11_DEPTH, mode=Mode.SUBTRACT)


solid = part.part
